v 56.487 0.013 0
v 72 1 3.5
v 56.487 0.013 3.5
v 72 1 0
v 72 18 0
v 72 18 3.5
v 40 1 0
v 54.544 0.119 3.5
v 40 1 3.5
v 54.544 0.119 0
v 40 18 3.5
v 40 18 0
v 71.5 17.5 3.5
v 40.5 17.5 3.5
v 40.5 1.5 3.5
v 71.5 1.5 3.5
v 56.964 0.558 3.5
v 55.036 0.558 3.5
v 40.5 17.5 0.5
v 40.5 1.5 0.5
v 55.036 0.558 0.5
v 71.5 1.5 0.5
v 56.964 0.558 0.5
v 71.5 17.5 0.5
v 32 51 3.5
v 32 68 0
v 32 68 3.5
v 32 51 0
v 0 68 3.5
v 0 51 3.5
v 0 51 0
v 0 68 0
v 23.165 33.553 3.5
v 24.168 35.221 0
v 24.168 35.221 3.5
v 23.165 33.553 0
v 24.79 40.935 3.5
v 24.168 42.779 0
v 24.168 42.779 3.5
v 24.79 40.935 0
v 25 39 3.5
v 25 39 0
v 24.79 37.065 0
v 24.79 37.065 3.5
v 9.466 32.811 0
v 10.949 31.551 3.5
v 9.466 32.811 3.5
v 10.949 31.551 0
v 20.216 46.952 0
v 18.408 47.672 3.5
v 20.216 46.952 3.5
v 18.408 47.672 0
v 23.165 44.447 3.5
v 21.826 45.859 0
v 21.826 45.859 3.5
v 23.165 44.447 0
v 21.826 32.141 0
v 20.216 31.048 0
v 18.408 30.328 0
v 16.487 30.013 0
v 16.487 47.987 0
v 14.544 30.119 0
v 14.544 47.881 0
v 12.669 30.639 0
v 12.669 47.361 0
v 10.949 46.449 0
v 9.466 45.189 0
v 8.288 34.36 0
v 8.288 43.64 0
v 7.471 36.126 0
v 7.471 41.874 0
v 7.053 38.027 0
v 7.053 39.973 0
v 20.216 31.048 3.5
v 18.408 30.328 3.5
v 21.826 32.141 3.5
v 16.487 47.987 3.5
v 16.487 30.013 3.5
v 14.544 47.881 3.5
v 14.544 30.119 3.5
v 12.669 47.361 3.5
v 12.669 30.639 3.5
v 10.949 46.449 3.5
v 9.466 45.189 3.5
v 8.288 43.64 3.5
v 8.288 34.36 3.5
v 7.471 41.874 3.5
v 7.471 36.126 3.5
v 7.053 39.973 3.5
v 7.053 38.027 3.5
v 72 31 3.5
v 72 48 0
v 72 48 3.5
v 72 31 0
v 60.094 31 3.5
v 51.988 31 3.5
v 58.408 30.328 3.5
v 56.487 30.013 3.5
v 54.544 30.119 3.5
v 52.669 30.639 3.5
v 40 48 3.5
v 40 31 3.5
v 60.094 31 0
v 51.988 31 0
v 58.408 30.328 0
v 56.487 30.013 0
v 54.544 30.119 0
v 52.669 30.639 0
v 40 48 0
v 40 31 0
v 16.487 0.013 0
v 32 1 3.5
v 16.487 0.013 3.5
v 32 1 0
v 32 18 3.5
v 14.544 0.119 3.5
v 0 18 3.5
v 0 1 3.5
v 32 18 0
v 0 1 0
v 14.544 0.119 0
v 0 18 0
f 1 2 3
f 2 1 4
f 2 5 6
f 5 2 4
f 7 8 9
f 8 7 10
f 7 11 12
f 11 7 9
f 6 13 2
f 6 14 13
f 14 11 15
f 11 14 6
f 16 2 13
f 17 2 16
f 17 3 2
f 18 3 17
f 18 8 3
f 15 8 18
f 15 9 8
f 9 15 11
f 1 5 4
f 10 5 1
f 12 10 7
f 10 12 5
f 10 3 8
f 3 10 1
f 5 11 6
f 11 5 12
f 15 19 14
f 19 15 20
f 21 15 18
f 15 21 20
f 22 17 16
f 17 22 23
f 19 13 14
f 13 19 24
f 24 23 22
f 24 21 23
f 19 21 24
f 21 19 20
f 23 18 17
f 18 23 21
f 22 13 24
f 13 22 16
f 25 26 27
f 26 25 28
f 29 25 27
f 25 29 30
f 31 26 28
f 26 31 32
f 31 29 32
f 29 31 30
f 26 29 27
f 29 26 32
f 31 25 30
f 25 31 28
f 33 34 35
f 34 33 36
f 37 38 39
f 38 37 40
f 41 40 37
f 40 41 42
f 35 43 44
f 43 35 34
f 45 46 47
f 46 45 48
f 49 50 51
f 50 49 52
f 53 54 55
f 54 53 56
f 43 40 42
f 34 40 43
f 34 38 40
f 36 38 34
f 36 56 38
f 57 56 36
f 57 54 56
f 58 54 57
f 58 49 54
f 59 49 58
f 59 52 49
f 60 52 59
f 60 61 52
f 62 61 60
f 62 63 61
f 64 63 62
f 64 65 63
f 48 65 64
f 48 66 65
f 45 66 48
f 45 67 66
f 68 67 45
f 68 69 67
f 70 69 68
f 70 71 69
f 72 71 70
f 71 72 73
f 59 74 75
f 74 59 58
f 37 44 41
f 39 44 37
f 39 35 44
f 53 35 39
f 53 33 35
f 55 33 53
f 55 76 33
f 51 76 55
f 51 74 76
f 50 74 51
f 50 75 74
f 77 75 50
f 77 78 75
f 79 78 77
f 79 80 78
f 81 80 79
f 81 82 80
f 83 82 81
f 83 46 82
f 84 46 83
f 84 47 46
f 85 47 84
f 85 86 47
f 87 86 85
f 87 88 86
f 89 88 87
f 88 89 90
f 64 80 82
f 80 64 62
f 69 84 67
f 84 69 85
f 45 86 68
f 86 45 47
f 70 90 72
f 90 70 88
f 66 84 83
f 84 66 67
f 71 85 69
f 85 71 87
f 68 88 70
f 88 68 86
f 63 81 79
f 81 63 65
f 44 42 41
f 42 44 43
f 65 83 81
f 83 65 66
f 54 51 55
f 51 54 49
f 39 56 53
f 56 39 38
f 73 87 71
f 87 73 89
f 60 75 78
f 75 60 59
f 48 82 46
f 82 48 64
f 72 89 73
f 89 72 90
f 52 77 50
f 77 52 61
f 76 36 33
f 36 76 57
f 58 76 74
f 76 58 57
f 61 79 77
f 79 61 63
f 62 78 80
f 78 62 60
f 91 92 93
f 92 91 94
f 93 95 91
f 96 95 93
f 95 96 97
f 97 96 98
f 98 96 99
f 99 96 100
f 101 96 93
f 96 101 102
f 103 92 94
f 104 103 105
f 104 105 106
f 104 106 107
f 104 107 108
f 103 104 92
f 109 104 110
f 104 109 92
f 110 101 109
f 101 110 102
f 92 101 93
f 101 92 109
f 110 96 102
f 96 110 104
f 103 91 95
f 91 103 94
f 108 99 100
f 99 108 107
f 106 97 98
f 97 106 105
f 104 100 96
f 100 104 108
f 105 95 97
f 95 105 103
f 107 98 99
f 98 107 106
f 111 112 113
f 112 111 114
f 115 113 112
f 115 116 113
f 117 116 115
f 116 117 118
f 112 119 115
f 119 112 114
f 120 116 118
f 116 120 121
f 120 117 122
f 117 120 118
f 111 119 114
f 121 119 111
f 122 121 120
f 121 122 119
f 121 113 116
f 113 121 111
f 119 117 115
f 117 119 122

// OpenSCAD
//cube and rectangle
translate([0,51,0]) cube([32,17,3.5]);
translate([16,39,0]) cylinder(3.5,9,9);

//Both shapes together
translate([40,31,0]) cube([32,17,3.5]);
translate([56,39,0]) cylinder(3.5,9,9);

//Put a hull round them
hull(){
    translate([0,1,0]) cube([32,17,3.5]);
    translate([16,9,0]) cylinder(3.5,9,9);
}

//Carve out the interior
translate([40,0,0]) difference(){
    hull(){   //outside of caps lock key cover
        translate([0,1,0]) cube([32,17,3.5]);
        translate([16,9,0]) cylinder(3.5,9,9);
    }
    hull(){   //inside of caps lock key cover
        translate([0.5,1.5,0.5]) cube([31,16,3]);
        translate([16,8.5,0.5]) cylinder(3,8,8);
    }
} 
